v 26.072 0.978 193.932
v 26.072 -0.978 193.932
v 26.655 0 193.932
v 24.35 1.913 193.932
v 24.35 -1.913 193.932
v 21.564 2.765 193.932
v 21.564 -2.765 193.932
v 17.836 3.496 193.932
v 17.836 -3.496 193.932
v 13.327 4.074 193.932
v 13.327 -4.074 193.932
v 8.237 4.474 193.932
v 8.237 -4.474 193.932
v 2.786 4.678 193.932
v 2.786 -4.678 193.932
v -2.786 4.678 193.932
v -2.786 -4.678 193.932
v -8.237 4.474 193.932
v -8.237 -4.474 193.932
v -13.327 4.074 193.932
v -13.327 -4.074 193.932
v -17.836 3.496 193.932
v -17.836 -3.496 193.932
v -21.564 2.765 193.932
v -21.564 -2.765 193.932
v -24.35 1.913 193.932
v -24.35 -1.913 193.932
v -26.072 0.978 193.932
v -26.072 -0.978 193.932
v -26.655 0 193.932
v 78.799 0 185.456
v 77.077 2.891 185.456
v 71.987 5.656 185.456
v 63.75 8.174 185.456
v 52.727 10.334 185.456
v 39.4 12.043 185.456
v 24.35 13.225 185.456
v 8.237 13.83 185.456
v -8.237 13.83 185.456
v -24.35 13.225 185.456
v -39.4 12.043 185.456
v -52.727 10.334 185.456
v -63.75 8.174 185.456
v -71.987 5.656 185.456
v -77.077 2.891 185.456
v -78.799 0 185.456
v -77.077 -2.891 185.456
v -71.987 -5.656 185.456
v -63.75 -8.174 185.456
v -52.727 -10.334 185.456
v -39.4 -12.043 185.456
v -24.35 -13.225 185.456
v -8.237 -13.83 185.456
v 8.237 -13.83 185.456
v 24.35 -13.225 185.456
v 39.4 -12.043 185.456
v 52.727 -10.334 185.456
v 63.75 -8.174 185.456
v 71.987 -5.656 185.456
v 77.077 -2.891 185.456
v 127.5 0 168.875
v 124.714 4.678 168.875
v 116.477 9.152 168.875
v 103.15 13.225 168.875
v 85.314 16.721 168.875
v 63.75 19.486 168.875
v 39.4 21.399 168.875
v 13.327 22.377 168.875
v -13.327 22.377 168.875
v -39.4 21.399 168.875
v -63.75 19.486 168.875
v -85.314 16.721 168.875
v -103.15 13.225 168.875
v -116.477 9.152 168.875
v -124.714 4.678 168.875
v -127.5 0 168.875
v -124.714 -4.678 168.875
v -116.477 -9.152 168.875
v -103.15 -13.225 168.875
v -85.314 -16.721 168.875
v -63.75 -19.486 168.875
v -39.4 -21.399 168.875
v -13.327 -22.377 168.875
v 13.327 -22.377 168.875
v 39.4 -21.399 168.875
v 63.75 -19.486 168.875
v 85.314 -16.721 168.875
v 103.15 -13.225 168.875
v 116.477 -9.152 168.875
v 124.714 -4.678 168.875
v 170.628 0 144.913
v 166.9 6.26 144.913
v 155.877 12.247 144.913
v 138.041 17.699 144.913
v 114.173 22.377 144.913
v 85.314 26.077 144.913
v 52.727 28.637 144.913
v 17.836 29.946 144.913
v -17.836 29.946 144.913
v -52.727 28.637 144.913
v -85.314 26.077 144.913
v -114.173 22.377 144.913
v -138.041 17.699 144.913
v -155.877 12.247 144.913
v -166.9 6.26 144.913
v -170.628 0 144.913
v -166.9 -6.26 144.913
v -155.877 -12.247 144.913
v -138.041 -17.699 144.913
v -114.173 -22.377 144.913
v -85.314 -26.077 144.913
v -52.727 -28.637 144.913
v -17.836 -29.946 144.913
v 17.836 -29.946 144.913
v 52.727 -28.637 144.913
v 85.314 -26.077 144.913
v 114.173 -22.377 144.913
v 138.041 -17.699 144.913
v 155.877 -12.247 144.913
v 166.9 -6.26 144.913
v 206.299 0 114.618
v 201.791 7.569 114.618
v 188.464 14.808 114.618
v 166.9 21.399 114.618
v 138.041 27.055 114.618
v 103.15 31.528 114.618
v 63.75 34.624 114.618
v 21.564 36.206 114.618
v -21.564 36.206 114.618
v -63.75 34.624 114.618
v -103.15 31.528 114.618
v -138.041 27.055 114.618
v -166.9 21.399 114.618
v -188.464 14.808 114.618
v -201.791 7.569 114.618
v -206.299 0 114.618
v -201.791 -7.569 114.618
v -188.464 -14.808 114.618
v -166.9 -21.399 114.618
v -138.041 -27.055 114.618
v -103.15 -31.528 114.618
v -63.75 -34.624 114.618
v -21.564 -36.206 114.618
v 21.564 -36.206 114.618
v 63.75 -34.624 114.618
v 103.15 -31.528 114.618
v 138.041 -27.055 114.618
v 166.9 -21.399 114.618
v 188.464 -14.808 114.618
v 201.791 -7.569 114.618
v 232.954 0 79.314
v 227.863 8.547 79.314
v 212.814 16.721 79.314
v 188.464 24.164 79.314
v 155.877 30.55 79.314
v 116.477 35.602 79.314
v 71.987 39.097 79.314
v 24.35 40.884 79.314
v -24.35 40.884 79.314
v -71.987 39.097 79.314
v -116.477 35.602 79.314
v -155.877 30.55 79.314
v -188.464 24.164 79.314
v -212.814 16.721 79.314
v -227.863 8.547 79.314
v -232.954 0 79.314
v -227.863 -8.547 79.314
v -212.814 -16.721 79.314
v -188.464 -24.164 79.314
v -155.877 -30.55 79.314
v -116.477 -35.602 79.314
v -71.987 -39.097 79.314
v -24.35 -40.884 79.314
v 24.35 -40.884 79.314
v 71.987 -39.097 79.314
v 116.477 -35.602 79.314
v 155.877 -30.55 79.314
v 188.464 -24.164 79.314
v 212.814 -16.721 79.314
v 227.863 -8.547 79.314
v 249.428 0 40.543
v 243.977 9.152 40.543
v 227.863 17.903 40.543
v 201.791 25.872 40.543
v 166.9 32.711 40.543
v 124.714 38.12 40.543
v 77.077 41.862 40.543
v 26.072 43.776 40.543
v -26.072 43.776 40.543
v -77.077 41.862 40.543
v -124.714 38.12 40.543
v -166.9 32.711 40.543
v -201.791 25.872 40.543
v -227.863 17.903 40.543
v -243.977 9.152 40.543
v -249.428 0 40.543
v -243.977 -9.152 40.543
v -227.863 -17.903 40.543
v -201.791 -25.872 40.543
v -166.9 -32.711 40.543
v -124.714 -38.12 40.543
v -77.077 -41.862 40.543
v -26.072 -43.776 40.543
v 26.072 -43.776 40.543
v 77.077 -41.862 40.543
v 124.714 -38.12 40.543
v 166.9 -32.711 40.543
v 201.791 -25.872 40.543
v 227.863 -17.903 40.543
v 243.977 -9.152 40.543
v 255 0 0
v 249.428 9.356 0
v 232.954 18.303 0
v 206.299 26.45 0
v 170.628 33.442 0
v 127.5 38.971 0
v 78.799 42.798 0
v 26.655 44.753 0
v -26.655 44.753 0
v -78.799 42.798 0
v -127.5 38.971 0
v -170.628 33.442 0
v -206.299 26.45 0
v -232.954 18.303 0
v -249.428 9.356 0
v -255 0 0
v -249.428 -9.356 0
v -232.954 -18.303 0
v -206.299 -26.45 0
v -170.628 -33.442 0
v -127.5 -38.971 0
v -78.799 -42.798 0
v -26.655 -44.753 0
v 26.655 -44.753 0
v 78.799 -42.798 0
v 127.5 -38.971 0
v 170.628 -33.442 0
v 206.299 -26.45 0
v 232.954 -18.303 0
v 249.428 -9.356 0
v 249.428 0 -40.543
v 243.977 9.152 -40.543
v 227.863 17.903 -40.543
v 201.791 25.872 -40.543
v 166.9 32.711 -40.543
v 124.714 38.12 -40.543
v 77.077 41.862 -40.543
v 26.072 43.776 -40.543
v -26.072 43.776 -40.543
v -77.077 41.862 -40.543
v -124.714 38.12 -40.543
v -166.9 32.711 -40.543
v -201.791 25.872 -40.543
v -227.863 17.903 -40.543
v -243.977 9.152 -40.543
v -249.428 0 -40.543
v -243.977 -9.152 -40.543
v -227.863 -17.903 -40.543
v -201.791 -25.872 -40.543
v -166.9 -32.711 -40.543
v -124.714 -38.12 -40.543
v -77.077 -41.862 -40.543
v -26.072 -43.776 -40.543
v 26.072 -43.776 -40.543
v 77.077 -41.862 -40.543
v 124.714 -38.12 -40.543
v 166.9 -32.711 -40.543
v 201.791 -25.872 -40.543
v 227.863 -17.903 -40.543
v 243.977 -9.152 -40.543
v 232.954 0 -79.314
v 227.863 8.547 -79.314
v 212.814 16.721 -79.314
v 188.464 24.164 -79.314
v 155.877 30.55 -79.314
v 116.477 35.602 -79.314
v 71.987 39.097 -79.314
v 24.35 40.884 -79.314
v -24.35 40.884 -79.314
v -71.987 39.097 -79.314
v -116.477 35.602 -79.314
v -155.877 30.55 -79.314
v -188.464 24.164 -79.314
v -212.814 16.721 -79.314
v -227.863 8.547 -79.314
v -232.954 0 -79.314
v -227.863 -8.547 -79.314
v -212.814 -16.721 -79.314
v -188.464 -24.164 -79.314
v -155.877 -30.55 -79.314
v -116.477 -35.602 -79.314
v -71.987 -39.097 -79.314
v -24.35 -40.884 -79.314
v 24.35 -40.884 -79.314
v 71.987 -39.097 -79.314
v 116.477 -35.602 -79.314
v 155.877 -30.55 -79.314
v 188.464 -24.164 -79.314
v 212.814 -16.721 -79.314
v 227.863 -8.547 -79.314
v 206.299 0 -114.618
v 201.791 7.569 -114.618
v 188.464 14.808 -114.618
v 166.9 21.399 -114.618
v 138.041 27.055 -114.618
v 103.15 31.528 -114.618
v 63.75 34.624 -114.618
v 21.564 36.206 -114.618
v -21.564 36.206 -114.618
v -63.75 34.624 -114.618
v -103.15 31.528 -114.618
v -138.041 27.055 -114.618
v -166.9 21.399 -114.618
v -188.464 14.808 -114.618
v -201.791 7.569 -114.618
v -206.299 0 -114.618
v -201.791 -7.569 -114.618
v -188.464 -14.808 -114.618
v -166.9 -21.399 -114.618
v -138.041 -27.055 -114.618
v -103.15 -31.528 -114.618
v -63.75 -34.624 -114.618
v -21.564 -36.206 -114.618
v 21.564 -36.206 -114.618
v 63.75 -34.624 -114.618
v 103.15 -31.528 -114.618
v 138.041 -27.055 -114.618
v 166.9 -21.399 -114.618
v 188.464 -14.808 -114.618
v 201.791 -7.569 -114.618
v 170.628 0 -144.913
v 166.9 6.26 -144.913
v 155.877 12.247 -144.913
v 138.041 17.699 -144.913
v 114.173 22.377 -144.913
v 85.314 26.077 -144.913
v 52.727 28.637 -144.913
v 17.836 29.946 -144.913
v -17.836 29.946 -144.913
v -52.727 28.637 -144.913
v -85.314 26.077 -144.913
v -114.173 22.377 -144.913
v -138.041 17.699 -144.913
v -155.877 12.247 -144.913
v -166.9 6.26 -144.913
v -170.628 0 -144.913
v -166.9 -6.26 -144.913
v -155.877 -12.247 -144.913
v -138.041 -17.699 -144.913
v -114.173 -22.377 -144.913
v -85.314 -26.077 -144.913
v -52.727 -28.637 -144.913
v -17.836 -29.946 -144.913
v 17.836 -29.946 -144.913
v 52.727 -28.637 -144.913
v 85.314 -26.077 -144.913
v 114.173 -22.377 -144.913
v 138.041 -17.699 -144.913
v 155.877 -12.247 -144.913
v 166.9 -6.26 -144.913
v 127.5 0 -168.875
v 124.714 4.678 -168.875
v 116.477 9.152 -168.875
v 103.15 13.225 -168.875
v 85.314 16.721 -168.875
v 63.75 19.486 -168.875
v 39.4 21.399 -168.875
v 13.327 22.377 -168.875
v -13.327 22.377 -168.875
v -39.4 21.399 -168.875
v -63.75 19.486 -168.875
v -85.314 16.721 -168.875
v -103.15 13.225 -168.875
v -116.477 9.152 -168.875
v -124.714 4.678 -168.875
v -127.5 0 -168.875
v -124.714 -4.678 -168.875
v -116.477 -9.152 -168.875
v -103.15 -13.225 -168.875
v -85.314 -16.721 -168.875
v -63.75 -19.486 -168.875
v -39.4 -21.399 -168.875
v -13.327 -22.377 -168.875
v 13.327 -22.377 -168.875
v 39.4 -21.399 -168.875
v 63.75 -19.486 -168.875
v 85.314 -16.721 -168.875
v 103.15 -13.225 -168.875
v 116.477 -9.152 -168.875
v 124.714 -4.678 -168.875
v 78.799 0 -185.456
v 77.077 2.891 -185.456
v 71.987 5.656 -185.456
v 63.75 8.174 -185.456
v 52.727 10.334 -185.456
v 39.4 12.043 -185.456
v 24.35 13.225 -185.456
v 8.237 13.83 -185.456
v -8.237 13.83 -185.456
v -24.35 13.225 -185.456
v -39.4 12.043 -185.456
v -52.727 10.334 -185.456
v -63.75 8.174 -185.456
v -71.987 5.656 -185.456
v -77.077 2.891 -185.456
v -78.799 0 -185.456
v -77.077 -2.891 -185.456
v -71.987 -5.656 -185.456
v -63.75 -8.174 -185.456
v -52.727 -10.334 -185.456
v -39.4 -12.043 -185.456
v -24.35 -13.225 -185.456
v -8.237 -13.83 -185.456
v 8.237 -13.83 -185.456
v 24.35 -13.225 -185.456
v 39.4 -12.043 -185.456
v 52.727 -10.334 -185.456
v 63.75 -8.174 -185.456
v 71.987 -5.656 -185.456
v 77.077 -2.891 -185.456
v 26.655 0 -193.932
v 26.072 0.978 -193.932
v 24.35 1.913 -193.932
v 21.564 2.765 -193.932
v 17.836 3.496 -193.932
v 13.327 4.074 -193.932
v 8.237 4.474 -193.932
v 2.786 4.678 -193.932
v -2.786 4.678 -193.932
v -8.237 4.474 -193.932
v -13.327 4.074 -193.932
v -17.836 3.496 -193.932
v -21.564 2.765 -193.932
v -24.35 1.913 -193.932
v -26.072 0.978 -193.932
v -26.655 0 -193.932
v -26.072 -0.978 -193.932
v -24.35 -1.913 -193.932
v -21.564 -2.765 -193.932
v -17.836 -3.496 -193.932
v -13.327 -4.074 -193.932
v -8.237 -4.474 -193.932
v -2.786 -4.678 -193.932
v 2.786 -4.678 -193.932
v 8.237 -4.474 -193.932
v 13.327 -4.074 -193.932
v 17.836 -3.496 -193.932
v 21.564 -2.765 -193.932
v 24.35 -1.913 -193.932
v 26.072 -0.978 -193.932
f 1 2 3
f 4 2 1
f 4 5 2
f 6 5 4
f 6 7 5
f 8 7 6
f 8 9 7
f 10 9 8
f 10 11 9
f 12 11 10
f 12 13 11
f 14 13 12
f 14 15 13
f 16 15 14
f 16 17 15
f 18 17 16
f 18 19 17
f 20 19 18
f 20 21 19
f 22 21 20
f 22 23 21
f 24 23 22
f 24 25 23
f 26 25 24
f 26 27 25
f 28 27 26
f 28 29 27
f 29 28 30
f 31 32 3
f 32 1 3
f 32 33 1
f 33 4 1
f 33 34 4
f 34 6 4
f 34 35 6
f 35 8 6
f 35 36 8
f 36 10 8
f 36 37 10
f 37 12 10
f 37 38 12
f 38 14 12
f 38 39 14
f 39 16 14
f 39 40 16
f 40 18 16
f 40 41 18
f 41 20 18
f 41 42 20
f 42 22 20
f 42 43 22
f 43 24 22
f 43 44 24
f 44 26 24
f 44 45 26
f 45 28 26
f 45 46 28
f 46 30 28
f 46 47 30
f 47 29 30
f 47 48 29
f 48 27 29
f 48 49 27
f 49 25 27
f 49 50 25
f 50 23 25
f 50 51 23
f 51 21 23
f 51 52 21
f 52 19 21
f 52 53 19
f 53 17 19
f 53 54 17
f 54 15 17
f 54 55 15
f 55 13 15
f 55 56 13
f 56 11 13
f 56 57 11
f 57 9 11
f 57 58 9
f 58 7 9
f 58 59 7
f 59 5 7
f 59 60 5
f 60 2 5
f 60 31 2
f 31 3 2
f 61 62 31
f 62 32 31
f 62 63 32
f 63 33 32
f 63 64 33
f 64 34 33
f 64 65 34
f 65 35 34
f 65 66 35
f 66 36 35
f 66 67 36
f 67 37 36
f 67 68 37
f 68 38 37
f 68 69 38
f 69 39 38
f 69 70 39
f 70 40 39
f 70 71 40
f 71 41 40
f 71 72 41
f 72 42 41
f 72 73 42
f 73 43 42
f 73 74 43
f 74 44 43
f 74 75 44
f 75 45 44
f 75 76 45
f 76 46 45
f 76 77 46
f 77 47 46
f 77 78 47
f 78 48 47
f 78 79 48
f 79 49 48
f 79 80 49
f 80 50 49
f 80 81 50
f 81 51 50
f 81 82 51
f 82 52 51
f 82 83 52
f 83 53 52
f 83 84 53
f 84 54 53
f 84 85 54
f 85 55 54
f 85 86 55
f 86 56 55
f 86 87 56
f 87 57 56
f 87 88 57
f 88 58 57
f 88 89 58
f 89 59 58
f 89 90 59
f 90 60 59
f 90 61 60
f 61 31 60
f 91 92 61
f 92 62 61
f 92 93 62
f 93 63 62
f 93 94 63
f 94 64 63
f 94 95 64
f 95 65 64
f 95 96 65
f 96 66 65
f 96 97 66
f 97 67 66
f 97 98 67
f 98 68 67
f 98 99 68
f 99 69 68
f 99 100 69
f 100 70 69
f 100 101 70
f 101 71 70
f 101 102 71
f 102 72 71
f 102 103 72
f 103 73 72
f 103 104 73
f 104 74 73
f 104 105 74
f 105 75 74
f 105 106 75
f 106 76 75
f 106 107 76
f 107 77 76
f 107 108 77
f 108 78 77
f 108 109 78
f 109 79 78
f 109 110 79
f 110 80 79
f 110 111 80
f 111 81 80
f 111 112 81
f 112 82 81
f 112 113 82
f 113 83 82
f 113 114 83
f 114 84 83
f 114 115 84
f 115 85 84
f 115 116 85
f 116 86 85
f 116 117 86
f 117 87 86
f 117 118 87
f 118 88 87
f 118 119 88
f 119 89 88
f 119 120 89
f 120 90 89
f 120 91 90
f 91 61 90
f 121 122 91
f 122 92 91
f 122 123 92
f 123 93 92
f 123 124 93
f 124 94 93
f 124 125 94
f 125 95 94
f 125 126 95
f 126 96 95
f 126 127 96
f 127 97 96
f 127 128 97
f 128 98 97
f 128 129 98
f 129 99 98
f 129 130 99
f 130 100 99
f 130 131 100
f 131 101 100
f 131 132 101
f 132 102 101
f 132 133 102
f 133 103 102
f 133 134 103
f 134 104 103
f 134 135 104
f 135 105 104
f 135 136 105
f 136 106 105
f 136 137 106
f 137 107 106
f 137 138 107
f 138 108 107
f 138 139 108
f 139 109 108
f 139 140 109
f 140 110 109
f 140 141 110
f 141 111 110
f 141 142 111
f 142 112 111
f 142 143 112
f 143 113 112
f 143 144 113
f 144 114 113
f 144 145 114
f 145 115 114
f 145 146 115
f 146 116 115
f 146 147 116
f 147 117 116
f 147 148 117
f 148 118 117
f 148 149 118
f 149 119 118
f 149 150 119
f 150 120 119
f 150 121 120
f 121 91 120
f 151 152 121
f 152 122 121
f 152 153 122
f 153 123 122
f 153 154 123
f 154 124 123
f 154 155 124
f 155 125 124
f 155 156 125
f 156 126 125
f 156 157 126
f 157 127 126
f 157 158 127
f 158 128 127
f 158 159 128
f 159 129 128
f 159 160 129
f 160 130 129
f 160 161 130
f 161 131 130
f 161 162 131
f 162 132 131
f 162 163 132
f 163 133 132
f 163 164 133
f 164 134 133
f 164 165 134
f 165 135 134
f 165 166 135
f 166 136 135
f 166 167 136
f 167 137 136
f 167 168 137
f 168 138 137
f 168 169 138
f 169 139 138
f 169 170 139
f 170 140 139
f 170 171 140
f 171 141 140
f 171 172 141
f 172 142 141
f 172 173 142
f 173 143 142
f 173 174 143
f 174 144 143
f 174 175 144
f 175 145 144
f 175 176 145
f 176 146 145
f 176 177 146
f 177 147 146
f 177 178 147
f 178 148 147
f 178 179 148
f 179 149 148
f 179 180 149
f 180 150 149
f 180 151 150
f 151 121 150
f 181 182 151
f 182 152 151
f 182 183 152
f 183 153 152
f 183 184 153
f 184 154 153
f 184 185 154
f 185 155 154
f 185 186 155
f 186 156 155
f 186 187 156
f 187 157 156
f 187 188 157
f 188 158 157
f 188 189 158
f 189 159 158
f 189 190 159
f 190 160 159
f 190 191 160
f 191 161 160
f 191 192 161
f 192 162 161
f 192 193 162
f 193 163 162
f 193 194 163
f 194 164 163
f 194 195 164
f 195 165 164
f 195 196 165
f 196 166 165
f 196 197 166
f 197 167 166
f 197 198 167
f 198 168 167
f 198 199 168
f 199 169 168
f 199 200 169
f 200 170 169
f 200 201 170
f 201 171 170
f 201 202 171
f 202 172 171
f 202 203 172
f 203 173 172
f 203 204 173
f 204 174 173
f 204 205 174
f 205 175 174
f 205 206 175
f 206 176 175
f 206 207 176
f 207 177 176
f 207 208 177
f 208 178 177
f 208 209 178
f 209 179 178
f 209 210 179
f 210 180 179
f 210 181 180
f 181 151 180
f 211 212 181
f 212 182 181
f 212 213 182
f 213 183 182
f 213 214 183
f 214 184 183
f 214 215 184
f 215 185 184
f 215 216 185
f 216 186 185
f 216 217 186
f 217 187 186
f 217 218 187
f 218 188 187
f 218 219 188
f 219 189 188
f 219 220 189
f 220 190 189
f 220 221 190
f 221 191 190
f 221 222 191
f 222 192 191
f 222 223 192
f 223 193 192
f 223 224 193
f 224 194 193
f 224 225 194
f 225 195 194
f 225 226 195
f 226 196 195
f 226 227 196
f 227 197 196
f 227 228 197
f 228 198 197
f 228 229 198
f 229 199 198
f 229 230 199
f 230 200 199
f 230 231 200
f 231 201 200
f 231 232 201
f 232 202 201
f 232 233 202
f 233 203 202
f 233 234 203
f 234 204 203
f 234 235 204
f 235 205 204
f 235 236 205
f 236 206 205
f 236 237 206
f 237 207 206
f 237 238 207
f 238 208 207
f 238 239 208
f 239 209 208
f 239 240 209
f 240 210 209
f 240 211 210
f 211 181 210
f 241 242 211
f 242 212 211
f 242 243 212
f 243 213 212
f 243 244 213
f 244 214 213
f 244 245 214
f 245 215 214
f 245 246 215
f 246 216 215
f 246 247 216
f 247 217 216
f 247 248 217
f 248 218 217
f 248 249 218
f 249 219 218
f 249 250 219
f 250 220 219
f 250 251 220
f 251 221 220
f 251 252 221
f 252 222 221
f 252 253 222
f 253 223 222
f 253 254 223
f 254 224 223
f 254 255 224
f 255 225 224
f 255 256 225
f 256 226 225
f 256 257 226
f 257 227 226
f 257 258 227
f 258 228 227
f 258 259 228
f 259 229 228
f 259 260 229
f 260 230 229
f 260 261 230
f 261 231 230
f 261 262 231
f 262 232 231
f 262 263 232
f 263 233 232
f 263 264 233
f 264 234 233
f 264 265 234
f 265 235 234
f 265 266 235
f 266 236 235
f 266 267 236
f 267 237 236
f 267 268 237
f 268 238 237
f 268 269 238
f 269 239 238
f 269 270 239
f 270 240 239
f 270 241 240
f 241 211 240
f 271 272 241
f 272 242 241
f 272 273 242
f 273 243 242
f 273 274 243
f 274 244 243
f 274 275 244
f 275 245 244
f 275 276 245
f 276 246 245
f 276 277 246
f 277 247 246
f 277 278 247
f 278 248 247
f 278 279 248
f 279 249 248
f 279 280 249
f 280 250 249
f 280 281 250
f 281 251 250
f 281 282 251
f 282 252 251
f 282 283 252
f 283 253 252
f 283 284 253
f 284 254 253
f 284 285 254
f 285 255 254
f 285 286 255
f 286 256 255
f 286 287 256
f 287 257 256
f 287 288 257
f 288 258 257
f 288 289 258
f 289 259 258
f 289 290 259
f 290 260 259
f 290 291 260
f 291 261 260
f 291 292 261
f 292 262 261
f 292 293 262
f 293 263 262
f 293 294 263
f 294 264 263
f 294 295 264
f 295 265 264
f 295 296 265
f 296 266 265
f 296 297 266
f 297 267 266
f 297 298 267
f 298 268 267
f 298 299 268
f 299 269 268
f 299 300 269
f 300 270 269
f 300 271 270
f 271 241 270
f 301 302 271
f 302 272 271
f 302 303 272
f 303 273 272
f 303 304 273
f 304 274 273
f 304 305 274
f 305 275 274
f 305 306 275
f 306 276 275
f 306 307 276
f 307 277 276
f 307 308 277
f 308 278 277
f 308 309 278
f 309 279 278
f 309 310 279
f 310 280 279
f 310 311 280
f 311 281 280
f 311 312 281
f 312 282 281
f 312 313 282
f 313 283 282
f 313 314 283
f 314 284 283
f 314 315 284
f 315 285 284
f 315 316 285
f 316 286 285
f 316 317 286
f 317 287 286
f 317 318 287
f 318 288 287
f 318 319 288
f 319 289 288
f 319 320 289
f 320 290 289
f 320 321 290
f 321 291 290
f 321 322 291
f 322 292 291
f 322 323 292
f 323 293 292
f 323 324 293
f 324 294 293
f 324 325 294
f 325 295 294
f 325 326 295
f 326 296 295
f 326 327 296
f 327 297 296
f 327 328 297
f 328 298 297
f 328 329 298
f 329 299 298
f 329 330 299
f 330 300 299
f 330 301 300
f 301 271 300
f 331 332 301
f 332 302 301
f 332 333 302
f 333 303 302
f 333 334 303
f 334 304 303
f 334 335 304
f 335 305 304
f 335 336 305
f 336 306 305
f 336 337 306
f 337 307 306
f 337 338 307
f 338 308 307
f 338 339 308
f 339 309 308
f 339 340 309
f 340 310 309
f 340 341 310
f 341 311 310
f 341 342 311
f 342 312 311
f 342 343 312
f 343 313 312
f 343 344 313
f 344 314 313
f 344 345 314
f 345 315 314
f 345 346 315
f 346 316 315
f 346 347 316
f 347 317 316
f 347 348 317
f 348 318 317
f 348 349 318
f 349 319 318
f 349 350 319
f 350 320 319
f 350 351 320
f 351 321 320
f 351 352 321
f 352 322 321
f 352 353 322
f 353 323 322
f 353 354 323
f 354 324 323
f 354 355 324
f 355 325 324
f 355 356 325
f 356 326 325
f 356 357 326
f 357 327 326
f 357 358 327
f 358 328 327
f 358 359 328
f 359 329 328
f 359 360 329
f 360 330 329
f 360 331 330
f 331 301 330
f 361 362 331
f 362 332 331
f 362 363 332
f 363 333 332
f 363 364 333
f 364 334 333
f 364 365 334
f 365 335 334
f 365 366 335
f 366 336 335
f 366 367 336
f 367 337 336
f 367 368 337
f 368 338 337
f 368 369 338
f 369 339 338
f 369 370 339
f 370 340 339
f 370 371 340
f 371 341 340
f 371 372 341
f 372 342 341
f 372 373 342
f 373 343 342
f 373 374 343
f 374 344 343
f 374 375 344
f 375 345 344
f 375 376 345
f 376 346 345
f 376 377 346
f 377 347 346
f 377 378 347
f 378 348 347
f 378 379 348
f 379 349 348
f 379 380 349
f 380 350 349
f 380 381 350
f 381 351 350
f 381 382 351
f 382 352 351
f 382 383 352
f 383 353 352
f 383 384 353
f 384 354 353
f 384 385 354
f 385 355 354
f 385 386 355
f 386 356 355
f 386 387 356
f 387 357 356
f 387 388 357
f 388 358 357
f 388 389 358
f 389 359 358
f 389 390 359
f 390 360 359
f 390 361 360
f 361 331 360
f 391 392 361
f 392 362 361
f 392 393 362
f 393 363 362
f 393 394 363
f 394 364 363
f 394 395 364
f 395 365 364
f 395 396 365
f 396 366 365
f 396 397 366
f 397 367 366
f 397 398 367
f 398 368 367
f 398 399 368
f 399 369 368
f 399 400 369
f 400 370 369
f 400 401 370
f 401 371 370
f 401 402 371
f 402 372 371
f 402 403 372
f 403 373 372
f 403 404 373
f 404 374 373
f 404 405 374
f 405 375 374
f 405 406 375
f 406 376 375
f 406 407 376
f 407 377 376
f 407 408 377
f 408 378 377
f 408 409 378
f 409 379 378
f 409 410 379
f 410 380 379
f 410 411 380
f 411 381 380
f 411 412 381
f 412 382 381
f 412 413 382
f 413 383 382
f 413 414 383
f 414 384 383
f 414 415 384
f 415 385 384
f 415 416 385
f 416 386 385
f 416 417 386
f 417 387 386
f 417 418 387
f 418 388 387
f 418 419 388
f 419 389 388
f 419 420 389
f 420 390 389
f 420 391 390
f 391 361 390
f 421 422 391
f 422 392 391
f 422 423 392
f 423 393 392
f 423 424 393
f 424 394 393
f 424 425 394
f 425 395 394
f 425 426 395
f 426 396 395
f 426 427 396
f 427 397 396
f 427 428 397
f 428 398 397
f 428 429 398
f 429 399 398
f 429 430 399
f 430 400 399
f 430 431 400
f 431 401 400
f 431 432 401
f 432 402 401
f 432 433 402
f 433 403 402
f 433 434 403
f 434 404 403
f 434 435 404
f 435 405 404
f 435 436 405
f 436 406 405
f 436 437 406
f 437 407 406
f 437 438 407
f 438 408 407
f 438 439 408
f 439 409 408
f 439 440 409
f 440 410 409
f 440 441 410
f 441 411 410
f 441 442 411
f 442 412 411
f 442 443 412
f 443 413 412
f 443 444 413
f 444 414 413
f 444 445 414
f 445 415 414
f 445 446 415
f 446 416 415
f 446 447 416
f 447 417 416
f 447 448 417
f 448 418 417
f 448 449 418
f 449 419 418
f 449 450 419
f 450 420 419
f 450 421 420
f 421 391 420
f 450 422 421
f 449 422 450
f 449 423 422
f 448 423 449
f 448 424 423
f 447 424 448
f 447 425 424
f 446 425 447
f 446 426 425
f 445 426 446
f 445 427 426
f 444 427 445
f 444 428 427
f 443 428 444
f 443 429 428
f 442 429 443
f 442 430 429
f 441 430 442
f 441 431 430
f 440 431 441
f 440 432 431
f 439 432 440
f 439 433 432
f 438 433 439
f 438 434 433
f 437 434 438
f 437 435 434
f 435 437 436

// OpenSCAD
// Generated by SolidPython 1.0.1 on 2020-07-29 00:46:52


scale(v = [17, 3, 13]) {
	sphere(r = 15);
}
/***********************************************
*********      SolidPython code:      **********
************************************************
 
# import packages: SolidPython
from solid import *
from solid.utils import *
from itertools import chain, combinations, permutations


class Resize:

    def __init__(self, scad_file):
        self.scad_file = scad_file
        #self.scad_file = import_scad(scad_file)
        # cone/cylinder param:
        self.r1 = 0
        self.r2 = 0
        self.h = 0
        # rectangular prism param:
        self.w = 0
        self.l = 0
        # ellipse param:
        self.r = 0

    # import OpenScad code (file name corresponds to shape)


    # classify shape + parameters
    def assign(self, param1, param2, param3):
        if self.scad_file == 'cone.scad':
            self.r1 = param1
            self.r2 = param2
            self.h = param3
        elif self.scad_file == 'cylinder.scad':
            self.r1 = param1
            self.r2 = param2
            self.h = param3
        elif self.scad_file == 'rectangularPrism.scad':
            self.h = param1
            self.l = param2
            self.w = param3
        else:
            self.r = param1
            self.h = param2

    # resize parameters
    def iterate(self):
        x = range(3, 20, 2)
        i = 1
        if self.scad_file == 'cone.scad':
            tempList = list(permutations(x, 2))
            for temp in tempList:
                param1 = temp[0]
                param2 = temp[1]
                filepath = 'produced_scad_files/' + 'cone' + str(param1) + '_' + str(param2) + '_' + '.scad'
                scad_render_to_file(cylinder(h=param1, r1=param2, r2=0), filepath)

        elif self.scad_file == 'cylinder.scad':
            tempList = list(permutations(x, 3))
            for temp in tempList:
                param1 = temp[0]
                param2 = temp[1]
                filepath = 'produced_scad_files/' + 'cylinder' + str(param1) + '_' + str(param2) + '_' + '.scad'
                scad_render_to_file(cylinder(h=param1, r1=param2, r2=param2), filepath)

        elif self.scad_file == 'rectangularPrism.scad':
            tempList = list(permutations(x, 3))
            for temp in tempList:
                param1 = temp[0]
                param2 = temp[1]
                param3 = temp[2]
                filepath = 'produced_scad_files/' + 'rectangularPrism' + str(param1) + '_' + str(param2) + '_' + str(
                    param3) + '.scad'
                scad_render_to_file(cube(size=(param1, param2, param3)), filepath)

        elif self.scad_file == 'ellipse.scad':
            tempList = list(permutations(x, 4))
            for temp in tempList:
                param1 = temp[0]
                param2 = temp[1]
                param3 = temp[2]
                param4 = temp[3]
                filepath = 'produced_scad_files/' + 'ellipse' + str(param1) + '_' + str(param2) + '_' + str(param3) + '_' + str(param4) + '.scad'
                scad_render_to_file(scale([param1, param2, param3])(sphere(r=param4)), filepath)

    def render_to_scadfile(self):
        scad_render_to_file(scad, 'example.scad') 
 
************************************************/
